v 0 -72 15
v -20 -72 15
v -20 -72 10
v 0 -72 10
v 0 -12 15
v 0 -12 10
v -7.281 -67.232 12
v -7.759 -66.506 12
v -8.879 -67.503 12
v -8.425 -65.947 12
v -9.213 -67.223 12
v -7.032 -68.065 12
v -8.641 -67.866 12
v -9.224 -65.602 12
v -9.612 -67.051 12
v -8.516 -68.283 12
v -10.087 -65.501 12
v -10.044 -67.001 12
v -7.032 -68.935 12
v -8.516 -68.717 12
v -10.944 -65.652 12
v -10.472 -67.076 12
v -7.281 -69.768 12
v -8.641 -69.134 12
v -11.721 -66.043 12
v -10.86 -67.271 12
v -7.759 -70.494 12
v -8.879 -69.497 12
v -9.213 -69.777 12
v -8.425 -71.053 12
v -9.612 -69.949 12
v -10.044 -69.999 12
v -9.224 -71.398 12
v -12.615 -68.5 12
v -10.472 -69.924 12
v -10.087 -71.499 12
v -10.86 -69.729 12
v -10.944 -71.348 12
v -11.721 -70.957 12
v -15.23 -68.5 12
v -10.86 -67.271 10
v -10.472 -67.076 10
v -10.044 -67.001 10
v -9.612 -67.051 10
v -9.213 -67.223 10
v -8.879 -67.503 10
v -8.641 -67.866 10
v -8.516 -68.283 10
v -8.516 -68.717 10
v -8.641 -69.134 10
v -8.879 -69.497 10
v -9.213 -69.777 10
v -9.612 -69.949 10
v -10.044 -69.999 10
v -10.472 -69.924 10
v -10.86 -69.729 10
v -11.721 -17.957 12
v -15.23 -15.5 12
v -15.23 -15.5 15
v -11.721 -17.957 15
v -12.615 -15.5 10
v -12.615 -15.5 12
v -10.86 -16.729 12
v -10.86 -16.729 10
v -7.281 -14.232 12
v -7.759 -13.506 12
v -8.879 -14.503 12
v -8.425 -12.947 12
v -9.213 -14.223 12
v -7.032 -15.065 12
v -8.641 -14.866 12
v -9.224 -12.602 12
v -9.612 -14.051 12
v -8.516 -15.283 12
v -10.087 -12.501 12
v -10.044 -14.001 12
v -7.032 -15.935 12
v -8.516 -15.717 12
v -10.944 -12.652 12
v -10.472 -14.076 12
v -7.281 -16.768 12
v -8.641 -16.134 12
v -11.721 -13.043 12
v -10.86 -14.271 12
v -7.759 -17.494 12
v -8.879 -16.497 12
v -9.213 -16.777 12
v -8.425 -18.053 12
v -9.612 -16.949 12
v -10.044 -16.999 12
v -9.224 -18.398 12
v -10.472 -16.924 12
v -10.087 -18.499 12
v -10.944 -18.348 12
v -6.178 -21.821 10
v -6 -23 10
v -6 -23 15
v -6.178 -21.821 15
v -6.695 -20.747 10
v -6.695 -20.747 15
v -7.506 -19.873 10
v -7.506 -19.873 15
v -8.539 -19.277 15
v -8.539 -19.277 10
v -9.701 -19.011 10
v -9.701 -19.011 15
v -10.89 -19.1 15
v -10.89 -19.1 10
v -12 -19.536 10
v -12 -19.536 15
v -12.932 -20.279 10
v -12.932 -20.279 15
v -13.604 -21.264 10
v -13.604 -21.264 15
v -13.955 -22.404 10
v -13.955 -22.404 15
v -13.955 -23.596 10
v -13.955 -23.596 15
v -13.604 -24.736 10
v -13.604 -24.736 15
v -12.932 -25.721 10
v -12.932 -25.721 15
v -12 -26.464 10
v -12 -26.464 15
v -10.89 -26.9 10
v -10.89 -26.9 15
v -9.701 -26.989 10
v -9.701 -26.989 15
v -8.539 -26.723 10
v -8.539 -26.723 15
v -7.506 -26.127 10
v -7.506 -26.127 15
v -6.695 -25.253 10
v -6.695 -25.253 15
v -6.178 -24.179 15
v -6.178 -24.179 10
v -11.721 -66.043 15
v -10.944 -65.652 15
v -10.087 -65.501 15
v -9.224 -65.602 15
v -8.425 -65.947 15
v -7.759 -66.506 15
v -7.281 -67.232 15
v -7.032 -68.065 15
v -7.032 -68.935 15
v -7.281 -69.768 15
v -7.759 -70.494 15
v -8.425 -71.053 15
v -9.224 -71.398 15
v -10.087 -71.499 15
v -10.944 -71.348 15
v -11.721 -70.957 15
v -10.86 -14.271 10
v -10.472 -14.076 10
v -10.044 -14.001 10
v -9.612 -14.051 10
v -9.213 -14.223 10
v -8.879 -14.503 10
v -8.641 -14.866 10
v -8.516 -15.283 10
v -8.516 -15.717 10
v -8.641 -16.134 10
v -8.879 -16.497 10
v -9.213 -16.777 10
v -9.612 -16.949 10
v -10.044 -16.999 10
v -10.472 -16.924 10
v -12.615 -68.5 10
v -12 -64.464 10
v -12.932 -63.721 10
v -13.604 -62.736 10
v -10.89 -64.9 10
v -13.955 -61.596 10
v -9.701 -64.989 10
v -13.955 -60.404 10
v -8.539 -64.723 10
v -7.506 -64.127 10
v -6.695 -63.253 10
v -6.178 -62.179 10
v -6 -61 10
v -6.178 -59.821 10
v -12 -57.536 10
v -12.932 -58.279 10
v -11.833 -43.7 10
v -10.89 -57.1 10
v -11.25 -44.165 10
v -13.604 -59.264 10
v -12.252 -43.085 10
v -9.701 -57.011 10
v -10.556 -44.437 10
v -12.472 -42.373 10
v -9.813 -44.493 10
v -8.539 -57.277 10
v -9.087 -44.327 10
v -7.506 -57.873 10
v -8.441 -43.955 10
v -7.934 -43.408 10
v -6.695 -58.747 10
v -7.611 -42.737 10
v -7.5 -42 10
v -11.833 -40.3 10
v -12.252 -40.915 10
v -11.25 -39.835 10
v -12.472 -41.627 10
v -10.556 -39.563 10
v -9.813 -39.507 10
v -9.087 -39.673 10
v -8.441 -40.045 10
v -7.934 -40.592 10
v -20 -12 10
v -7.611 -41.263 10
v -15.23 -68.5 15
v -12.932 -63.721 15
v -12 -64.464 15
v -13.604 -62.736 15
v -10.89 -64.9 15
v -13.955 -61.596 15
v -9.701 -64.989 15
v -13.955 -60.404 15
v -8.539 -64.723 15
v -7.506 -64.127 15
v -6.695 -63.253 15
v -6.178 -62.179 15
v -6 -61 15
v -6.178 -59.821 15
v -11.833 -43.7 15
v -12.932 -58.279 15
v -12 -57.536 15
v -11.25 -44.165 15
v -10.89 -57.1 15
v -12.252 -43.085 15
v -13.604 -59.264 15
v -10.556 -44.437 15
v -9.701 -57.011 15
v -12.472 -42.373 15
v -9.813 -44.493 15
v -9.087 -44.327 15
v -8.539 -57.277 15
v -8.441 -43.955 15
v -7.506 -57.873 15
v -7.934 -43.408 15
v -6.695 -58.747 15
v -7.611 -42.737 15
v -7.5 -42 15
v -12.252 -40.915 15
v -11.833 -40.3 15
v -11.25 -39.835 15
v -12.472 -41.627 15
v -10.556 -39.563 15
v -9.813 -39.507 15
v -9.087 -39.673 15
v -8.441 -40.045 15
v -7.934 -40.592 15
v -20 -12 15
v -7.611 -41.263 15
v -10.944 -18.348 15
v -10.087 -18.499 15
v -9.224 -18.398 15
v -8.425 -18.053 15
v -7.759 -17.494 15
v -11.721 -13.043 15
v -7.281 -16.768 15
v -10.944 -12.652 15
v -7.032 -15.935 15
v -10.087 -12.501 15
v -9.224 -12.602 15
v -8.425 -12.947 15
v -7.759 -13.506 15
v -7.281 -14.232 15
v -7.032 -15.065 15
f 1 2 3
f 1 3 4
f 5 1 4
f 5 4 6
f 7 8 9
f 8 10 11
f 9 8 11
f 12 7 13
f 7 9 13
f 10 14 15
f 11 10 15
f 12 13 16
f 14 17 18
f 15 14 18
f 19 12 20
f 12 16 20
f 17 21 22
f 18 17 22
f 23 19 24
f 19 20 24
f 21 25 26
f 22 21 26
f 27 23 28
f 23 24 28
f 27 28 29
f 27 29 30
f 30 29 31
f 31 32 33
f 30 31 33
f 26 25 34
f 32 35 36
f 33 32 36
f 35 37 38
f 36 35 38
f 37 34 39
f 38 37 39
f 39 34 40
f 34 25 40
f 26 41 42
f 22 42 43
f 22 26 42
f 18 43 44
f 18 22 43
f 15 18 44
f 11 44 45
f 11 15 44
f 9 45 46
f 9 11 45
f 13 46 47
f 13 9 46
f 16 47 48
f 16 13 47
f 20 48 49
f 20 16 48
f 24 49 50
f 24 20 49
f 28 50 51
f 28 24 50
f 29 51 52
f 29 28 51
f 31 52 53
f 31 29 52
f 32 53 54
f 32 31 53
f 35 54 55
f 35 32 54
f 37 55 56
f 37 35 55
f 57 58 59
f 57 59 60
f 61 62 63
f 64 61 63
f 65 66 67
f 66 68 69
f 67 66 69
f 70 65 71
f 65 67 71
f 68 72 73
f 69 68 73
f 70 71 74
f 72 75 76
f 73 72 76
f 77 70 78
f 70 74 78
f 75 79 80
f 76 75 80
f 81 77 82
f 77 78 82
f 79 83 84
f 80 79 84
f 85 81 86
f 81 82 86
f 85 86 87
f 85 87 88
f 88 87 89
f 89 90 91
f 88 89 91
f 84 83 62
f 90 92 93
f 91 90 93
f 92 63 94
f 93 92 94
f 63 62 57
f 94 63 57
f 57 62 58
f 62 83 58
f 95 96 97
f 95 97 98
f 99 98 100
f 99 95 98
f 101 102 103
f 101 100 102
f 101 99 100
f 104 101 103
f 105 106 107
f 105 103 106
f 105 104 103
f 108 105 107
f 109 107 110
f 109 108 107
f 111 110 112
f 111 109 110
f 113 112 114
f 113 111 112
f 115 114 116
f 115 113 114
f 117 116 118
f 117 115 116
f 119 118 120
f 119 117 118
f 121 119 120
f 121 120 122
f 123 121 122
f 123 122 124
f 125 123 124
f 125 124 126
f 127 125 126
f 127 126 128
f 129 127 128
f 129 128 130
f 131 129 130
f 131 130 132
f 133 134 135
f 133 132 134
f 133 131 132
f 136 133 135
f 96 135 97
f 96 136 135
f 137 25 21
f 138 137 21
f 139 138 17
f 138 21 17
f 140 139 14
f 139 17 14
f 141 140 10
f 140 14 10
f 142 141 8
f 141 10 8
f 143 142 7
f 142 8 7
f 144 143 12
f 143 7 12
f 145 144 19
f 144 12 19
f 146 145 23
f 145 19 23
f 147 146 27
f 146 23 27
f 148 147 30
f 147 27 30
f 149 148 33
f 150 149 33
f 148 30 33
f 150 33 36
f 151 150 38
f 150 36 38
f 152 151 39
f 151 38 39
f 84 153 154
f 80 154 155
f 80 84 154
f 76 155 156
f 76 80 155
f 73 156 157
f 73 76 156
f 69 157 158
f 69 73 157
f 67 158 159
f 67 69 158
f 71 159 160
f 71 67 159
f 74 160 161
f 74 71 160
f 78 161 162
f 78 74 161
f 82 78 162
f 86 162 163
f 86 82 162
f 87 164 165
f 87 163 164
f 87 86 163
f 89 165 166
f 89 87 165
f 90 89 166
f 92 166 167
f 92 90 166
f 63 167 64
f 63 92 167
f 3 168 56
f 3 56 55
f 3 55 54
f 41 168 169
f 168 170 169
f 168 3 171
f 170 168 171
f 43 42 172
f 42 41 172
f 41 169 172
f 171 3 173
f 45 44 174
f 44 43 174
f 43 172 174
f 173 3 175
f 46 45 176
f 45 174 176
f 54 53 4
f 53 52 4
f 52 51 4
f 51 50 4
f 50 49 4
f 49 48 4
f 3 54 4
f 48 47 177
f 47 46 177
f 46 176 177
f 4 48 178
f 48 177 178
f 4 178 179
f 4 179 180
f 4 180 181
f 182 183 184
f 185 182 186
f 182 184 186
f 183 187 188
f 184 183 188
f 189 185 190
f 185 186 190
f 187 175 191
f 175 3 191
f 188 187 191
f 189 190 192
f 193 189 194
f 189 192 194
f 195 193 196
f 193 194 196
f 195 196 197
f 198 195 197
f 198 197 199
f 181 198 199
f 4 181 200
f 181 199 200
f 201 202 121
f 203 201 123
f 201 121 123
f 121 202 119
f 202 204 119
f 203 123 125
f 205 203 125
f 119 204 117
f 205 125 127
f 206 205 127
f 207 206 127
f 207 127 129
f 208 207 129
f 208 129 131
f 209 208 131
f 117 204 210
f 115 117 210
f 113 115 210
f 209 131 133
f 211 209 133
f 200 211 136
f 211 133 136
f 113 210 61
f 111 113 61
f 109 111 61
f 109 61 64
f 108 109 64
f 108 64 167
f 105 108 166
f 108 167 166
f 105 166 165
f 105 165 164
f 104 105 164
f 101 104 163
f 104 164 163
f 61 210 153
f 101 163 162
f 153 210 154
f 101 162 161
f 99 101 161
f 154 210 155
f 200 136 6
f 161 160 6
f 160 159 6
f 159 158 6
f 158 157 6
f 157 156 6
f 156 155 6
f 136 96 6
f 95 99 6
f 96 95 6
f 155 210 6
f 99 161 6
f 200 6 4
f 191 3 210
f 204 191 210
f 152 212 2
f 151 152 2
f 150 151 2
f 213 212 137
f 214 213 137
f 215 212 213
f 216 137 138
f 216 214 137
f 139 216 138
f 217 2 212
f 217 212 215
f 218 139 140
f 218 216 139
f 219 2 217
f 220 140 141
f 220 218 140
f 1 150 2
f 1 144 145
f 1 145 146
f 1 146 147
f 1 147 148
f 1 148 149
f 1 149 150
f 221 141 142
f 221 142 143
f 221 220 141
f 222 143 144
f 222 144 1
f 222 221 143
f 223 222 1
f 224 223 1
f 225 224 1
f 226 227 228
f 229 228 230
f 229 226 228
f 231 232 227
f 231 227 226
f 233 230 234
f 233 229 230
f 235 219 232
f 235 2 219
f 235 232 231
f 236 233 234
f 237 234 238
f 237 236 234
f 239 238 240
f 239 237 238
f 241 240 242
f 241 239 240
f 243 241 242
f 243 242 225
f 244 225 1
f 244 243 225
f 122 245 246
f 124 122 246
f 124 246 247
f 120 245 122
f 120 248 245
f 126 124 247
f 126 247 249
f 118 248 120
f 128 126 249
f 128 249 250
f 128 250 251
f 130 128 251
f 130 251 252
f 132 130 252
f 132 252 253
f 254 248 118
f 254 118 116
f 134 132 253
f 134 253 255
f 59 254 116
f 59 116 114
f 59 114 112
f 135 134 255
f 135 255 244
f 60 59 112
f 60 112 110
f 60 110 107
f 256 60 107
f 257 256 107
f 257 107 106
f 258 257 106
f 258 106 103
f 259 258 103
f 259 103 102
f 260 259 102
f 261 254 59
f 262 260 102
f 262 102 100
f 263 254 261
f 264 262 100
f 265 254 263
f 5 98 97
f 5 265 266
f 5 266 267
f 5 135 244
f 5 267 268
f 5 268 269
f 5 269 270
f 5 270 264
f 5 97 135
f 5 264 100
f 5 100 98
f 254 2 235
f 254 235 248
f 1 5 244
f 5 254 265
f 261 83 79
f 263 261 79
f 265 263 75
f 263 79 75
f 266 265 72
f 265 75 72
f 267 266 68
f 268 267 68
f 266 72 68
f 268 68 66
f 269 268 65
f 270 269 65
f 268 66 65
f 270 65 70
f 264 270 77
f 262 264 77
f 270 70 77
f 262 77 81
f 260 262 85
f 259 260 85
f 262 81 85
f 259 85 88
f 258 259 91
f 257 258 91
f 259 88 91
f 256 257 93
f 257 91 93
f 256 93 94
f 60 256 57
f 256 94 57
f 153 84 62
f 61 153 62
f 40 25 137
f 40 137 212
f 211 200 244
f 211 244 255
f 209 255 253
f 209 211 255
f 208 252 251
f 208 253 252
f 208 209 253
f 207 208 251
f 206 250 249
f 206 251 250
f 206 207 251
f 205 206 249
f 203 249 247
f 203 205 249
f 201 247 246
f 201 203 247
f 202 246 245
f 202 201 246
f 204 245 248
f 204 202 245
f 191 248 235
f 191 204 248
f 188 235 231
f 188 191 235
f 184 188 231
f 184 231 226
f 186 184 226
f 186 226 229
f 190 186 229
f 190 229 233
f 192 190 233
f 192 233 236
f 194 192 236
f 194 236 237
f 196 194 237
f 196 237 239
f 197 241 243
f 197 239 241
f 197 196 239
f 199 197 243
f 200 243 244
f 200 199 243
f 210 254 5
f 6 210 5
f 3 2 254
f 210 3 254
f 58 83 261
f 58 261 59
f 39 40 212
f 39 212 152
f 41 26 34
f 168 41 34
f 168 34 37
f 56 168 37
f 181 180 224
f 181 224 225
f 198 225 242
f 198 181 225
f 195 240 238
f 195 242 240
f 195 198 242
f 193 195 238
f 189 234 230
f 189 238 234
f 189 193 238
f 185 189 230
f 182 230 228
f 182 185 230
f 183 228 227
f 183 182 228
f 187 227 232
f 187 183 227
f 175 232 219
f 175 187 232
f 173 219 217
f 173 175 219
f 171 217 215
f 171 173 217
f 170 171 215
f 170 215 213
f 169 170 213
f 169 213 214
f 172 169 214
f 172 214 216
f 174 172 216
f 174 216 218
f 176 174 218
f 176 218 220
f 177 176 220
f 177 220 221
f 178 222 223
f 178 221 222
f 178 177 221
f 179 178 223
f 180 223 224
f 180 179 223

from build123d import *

# Parameters (mm, degrees)
PAD022_DEPTH             = 10
PAD023_DEPTH             = 20
CLONE091_PITCH_ANGLE     = 90
CLONE091_PLACEMENT_ANGLE = 90
CLONE090_ROLL_ANGLE      = 180
CLONE090_PLACEMENT_ANGLE = -90
CYLINDER1003_R           = 8
CYLINDER1003_DEPTH       = 5
CYLINDER1014_R           = 2.5
CYLINDER1014_DEPTH       = 100
CYLINDER1006_R           = 4
CYLINDER1006_DEPTH       = 70
ARRAY005_Y_COUNT         = 2
ARRAY005_Y_PITCH         = 38
PAD007_DEPTH             = 2.7
ARRAY002_Y_COUNT         = 2
ARRAY002_Y_PITCH         = 20
ARRAY001_Y_COUNT         = 2
ARRAY001_Y_PITCH         = 53
PAD020_DEPTH             = 10
PAD021_DEPTH             = 20
CLONE089_PLACEMENT_ANGLE = 90
ARRAY004_Y_COUNT         = 2
ARRAY004_Y_PITCH         = 20
CLONE088_ROLL_ANGLE      = 180
CLONE088_PLACEMENT_ANGLE = -90
ARRAY003_Y_COUNT         = 2
ARRAY003_Y_PITCH         = 53
PAD_DEPTH                = 20
CHAMFER_1_SIZE           = 16
CHAMFER_2_SIZE           = 5
SKETCH020_W              = 64
SKETCH020_H              = 45
POCKET_DEPTH             = 20.001
SKETCH021_W              = 52.5
SKETCH021_H              = 16
POCKET001_DEPTH          = 20.001
SKETCH022_W              = 25
SKETCH022_H              = 25
PAD019_DEPTH             = 50
CHAMFER017_SIZE          = 5
SKETCH023_W              = 20
SKETCH023_H              = 25
POCKET002_DEPTH          = 50.001
FILLET_1_R               = 4
FILLET_2_R               = 2
EXTRUDE_DEPTH            = 5
ARRAY_Z_COUNT            = 2
ARRAY_Z_PITCH            = 15
SKETCH025_W              = 20
SKETCH025_H              = 60
EXTRUDE001_DEPTH         = 5


with BuildPart() as m4tearbolt:
    # Sketch028 → Pad022 (new body)
    with BuildSketch(Plane.XY):
        with BuildLine():
            ThreePointArc((-3.2766, 2.294318), (0, -4), (3.2766, 2.294318))
            Line((0, 6.973787), (3.2766, 2.294318))
            Line((-3.2766, 2.294318), (0, 6.973787))
        make_face()
    extrude(amount=-PAD022_DEPTH)

    # Sketch029 → Pad023 (new body)
    with BuildSketch(Plane.XY):
        with BuildLine():
            ThreePointArc((-1.638314, 1.147138), (0, -2), (1.638314, 1.147138))
            Line((0, 3.486894), (1.638314, 1.147138))
            Line((-1.638314, 1.147138), (0, 3.486894))
        make_face()
    extrude(amount=PAD023_DEPTH)


with BuildPart() as clone_of_m4tearbolt001:
    # Clone091 base: copy of M4TearBolt
    add(m4tearbolt.part)


with BuildPart() as clone_of_m4tearbolt001_1:
    # Clone091 pitch: moved
    add(clone_of_m4tearbolt001.part.rotate(Axis((0, 0, 0), (0, 1, 0)), CLONE091_PITCH_ANGLE))


with BuildPart() as clone_of_m4tearbolt001_2:
    # Clone091 placement: moved
    add(clone_of_m4tearbolt001_1.part.moved(Location((-37, -15, 0))).rotate(Axis((-37, -15, 0), (0, 0, 1)), CLONE091_PLACEMENT_ANGLE))


with BuildPart() as clone_of_m4tearbolt:
    # Clone090 base: copy of M4TearBolt
    add(m4tearbolt.part)


with BuildPart() as clone_of_m4tearbolt_1:
    # Clone090 roll: moved
    add(clone_of_m4tearbolt.part.rotate(Axis((0, 0, 0), (1, 0, 0)), CLONE090_ROLL_ANGLE))


with BuildPart() as clone_of_m4tearbolt_2:
    # Clone090 placement: moved
    add(clone_of_m4tearbolt_1.part.moved(Location((-12, 0, 15))).rotate(Axis((-12, 0, 15), (0, 0, 1)), CLONE090_PLACEMENT_ANGLE))


with BuildPart() as clone_of_bearing625zzmaster:
    # Cylinder1003 → Cylinder1003 (new body)
    with BuildSketch(Plane.XY):
        Circle(CYLINDER1003_R)
    extrude(amount=CYLINDER1003_DEPTH)


with BuildPart() as clone_of_bearing625zzmaster_1:
    # Clone093 placement: moved
    add(clone_of_bearing625zzmaster.part.moved(Location((-10, -42, 5))))


with BuildPart() as f_5mmrodmaster:
    # Cylinder1014 → Cylinder1014 (new body)
    with BuildSketch(Plane.XY):
        Circle(CYLINDER1014_R)
    extrude(amount=CYLINDER1014_DEPTH)


with BuildPart() as clone_of_5mmrodmaster001:
    # Clone095 base: copy of 5mmRodMaster
    add(f_5mmrodmaster.part)


with BuildPart() as clone_of_5mmrodmaster001_1:
    # Clone095 placement: moved
    add(clone_of_5mmrodmaster001.part.moved(Location((-10, -18.5, 66))))


with BuildPart() as clone_of_5mmrodmaster:
    # Clone094 base: copy of 5mmRodMaster
    add(f_5mmrodmaster.part)


with BuildPart() as clone_of_5mmrodmaster_1:
    # Clone094 placement: moved
    add(clone_of_5mmrodmaster.part.moved(Location((-10, -42, 3.5))))


with BuildPart() as smrod:
    # Cylinder1006 → Cylinder1006 (new body)
    with BuildSketch(Plane.XY):
        Circle(CYLINDER1006_R)
    extrude(amount=CYLINDER1006_DEPTH)


with BuildPart() as smrod_1:
    # Clone092 placement: moved
    add(smrod.part.moved(Location((-10, -23, -5))))

    # Array005 Y: SmRod ×2


with BuildPart() as smrod_2:
    add(smrod_1.part)
    with Locations(*[(0, -i * ARRAY005_Y_PITCH, 0) for i in range(1, ARRAY005_Y_COUNT)]):
        add(smrod_1.part)


with BuildPart() as m3nuthousingmaster:
    # Sketch008 → Pad007 (new body)
    with BuildSketch(Plane.XY):
        Polygon((0, 0), (1.674316, 2.9), (21.674316, 2.9), (21.674316, -2.9), (1.674316, -2.9), align=None)
    extrude(amount=PAD007_DEPTH)


with BuildPart() as lowernuts:
    # Clone087 base: copy of M3NutHousingMaster
    add(m3nuthousingmaster.part)


with BuildPart() as lowernuts_1:
    # Clone087 placement: moved
    add(lowernuts.part.moved(Location((-15, -32, -8))))

    # Array002 Y: LowerNuts ×2


with BuildPart() as lowernuts_2:
    add(lowernuts_1.part)
    with Locations(*[(0, -i * ARRAY002_Y_PITCH, 0) for i in range(1, ARRAY002_Y_COUNT)]):
        add(lowernuts_1.part)


with BuildPart() as lowernuts_3:
    # Array002 placement: moved
    add(lowernuts_2.part.moved(Location((0, 0, 6))))


with BuildPart() as uppernuts:
    # Clone086 base: copy of M3NutHousingMaster
    add(m3nuthousingmaster.part)


with BuildPart() as uppernuts_1:
    # Clone086 placement: moved
    add(uppernuts.part.moved(Location((-14, -15.5, 3.5))))

    # Array001 Y: UpperNuts ×2


with BuildPart() as uppernuts_2:
    add(uppernuts_1.part)
    with Locations(*[(0, -i * ARRAY001_Y_PITCH, 0) for i in range(1, ARRAY001_Y_COUNT)]):
        add(uppernuts_1.part)


with BuildPart() as m3tearbolt:
    # Sketch026 → Pad020 (new body)
    with BuildSketch(Plane.XY):
        with BuildLine():
            ThreePointArc((-2.457464, 1.720718), (0, -3), (2.457464, 1.720718))
            Line((0, 5.23034), (2.457464, 1.720718))
            Line((-2.457464, 1.720718), (0, 5.23034))
        make_face()
    extrude(amount=-PAD020_DEPTH)

    # Sketch027 → Pad021 (new body)
    with BuildSketch(Plane.XY):
        with BuildLine():
            ThreePointArc((-1.228737, 0.860352), (0, -1.5), (1.228737, 0.860352))
            Line((0, 2.61517), (1.228737, 0.860352))
            Line((-1.228737, 0.860352), (0, 2.61517))
        make_face()
    extrude(amount=PAD021_DEPTH)


with BuildPart() as lowerbolts:
    # Clone089 base: copy of M3TearBolt
    add(m3tearbolt.part)


with BuildPart() as lowerbolts_1:
    # Clone089 placement: moved
    add(lowerbolts.part.moved(Location((-10.2, -32, -17))).rotate(Axis((-10.2, -32, -17), (0, 0, 1)), CLONE089_PLACEMENT_ANGLE))

    # Array004 Y: LowerBolts ×2


with BuildPart() as lowerbolts_2:
    add(lowerbolts_1.part)
    with Locations(*[(0, -i * ARRAY004_Y_PITCH, 0) for i in range(1, ARRAY004_Y_COUNT)]):
        add(lowerbolts_1.part)


with BuildPart() as upperbolts:
    # Clone088 base: copy of M3TearBolt
    add(m3tearbolt.part)


with BuildPart() as upperbolts_1:
    # Clone088 roll: moved
    add(upperbolts.part.rotate(Axis((0, 0, 0), (1, 0, 0)), CLONE088_ROLL_ANGLE))


with BuildPart() as upperbolts_2:
    # Clone088 placement: moved
    add(upperbolts_1.part.moved(Location((-10, -15.5, 12))).rotate(Axis((-10, -15.5, 12), (0, 0, 1)), CLONE088_PLACEMENT_ANGLE))

    # Array003 Y: UpperBolts ×2


with BuildPart() as upperbolts_3:
    add(upperbolts_2.part)
    with Locations(*[(0, -i * ARRAY003_Y_PITCH, 0) for i in range(1, ARRAY003_Y_COUNT)]):
        add(upperbolts_2.part)


with BuildPart() as nicefillet:
    # Sketch → Pad (new body)
    with BuildSketch(Plane.YZ):
        Polygon((0, 86), (-79, 86), (-79, -10), (-5, -10), (-5, 52.339746), (0, 61), align=None)
    extrude(amount=-PAD_DEPTH)

    # Chamfer 1
    chamfer_1_edges = [nicefillet.edges().sort_by_distance(p)[0] for p in [
        (-10, -79, 86),
    ]]
    chamfer(chamfer_1_edges, length=CHAMFER_1_SIZE)

    # Chamfer 2
    chamfer_2_edges = [nicefillet.edges().sort_by_distance(p)[0] for p in [
        (-10, 0, 86),
    ]]
    chamfer(chamfer_2_edges, length=CHAMFER_2_SIZE)

    # Sketch020 → Pocket (cut, through all)
    with BuildSketch(Plane.YZ):
        with Locations((-42, 37.5)):
            Rectangle(SKETCH020_W, SKETCH020_H)
    extrude(amount=-POCKET_DEPTH, mode=Mode.SUBTRACT)

    # Sketch021 → Pocket001 (cut, through all)
    with BuildSketch(Plane.YZ):
        with Locations((-33.75, 75.5)):
            Rectangle(SKETCH021_W, SKETCH021_H)
    extrude(amount=-POCKET001_DEPTH, mode=Mode.SUBTRACT)

    # Sketch022 → Pad019 (new body)
    with BuildSketch(Plane.YZ):
        with Locations((-2.5, 2.5)):
            Rectangle(SKETCH022_W, SKETCH022_H)
    extrude(amount=-PAD019_DEPTH)

    # Chamfer017
    chamfer017_edges = [nicefillet.edges().sort_by_distance(p)[0] for p in [
        (-10, -5, 15),
    ]]
    chamfer(chamfer017_edges, length=CHAMFER017_SIZE)

    # Sketch023 → Pocket002 (cut, through all)
    with BuildSketch(Plane.YZ):
        with Locations((0, -2.5)):
            Rectangle(SKETCH023_W, SKETCH023_H)
    extrude(amount=-POCKET002_DEPTH, mode=Mode.SUBTRACT)

    # Fillet 1
    fillet_1_edges = [nicefillet.edges().sort_by_distance(p)[0] for p in [
        (-35, -15, 15),
    ]]
    fillet(fillet_1_edges, radius=FILLET_1_R)

    # Fillet 2
    fillet_2_edges = [nicefillet.edges().sort_by_distance(p)[0] for p in [
        (-10, -5, 20),
        (-10, -5, 52.339746),
        (-10, 0, 15),
        (-10, 0, 61),
        (-10, 0, 81),
        (-10, -5, 86),
        (-10, -63, 86),
        (-10, -79, 70),
    ]]
    fillet(fillet_2_edges, radius=FILLET_2_R)


with BuildPart() as componentscut:
    # Sketch024 → Extrude (new body)
    with BuildSketch(Plane.XY.offset(15)):
        with BuildLine():
            Line((-42, -12), (-18, -12))
            Line((-18, -12), (-18, -67))
            add(Edge.make_bspline(
                [(-18, -67), (-21.374537, -28.653178), (-42, -12)],
                knots=[4.860682, 4.860682, 4.860682, 5.839233, 5.839233, 5.839233], degree=2, weights=[1, 0.882673, 1]))
        make_face()
    extrude(amount=-EXTRUDE_DEPTH)


with BuildPart() as componentscut_1:
    # Extrude placement: moved
    add(componentscut.part.moved(Location((0, 0, -5))))

    # Array Z: ComponentsCut ×2


with BuildPart() as componentscut_2:
    add(componentscut_1.part)
    with Locations(*[(0, 0, -i * ARRAY_Z_PITCH) for i in range(1, ARRAY_Z_COUNT)]):
        add(componentscut_1.part)

    # Fusion: union NiceFillet
    add(nicefillet.part)

    # Cut: cut UpperBolts
    add(upperbolts_3.part, mode=Mode.SUBTRACT)

    # Cut001: cut LowerBolts
    add(lowerbolts_2.part, mode=Mode.SUBTRACT)

    # Cut002: cut UpperNuts
    add(uppernuts_2.part, mode=Mode.SUBTRACT)

    # Cut003: cut LowerNuts
    add(lowernuts_3.part, mode=Mode.SUBTRACT)

    # Cut004: cut SmRod
    add(smrod_2.part, mode=Mode.SUBTRACT)

    # Cut005: cut Clone of 5mmRodMaster
    add(clone_of_5mmrodmaster_1.part, mode=Mode.SUBTRACT)

    # Cut006: cut Clone of 5mmRodMaster001
    add(clone_of_5mmrodmaster001_1.part, mode=Mode.SUBTRACT)

    # Cut007: cut Clone of Bearing625ZZMaster
    add(clone_of_bearing625zzmaster_1.part, mode=Mode.SUBTRACT)

    # Cut008: cut Clone of M4TearBolt
    add(clone_of_m4tearbolt_2.part, mode=Mode.SUBTRACT)

    # Cut009: cut Clone of M4TearBolt001
    add(clone_of_m4tearbolt001_2.part, mode=Mode.SUBTRACT)


with BuildPart() as upperlidcommon:
    # Sketch025 → Extrude001 (new body)
    with BuildSketch(Plane.XY.offset(15)):
        with Locations((-10, -42)):
            Rectangle(SKETCH025_W, SKETCH025_H)
    extrude(amount=-EXTRUDE001_DEPTH)

    # Common: intersect ComponentsCut
    add(componentscut_2.part, mode=Mode.INTERSECT)


solid = upperlidcommon.part
